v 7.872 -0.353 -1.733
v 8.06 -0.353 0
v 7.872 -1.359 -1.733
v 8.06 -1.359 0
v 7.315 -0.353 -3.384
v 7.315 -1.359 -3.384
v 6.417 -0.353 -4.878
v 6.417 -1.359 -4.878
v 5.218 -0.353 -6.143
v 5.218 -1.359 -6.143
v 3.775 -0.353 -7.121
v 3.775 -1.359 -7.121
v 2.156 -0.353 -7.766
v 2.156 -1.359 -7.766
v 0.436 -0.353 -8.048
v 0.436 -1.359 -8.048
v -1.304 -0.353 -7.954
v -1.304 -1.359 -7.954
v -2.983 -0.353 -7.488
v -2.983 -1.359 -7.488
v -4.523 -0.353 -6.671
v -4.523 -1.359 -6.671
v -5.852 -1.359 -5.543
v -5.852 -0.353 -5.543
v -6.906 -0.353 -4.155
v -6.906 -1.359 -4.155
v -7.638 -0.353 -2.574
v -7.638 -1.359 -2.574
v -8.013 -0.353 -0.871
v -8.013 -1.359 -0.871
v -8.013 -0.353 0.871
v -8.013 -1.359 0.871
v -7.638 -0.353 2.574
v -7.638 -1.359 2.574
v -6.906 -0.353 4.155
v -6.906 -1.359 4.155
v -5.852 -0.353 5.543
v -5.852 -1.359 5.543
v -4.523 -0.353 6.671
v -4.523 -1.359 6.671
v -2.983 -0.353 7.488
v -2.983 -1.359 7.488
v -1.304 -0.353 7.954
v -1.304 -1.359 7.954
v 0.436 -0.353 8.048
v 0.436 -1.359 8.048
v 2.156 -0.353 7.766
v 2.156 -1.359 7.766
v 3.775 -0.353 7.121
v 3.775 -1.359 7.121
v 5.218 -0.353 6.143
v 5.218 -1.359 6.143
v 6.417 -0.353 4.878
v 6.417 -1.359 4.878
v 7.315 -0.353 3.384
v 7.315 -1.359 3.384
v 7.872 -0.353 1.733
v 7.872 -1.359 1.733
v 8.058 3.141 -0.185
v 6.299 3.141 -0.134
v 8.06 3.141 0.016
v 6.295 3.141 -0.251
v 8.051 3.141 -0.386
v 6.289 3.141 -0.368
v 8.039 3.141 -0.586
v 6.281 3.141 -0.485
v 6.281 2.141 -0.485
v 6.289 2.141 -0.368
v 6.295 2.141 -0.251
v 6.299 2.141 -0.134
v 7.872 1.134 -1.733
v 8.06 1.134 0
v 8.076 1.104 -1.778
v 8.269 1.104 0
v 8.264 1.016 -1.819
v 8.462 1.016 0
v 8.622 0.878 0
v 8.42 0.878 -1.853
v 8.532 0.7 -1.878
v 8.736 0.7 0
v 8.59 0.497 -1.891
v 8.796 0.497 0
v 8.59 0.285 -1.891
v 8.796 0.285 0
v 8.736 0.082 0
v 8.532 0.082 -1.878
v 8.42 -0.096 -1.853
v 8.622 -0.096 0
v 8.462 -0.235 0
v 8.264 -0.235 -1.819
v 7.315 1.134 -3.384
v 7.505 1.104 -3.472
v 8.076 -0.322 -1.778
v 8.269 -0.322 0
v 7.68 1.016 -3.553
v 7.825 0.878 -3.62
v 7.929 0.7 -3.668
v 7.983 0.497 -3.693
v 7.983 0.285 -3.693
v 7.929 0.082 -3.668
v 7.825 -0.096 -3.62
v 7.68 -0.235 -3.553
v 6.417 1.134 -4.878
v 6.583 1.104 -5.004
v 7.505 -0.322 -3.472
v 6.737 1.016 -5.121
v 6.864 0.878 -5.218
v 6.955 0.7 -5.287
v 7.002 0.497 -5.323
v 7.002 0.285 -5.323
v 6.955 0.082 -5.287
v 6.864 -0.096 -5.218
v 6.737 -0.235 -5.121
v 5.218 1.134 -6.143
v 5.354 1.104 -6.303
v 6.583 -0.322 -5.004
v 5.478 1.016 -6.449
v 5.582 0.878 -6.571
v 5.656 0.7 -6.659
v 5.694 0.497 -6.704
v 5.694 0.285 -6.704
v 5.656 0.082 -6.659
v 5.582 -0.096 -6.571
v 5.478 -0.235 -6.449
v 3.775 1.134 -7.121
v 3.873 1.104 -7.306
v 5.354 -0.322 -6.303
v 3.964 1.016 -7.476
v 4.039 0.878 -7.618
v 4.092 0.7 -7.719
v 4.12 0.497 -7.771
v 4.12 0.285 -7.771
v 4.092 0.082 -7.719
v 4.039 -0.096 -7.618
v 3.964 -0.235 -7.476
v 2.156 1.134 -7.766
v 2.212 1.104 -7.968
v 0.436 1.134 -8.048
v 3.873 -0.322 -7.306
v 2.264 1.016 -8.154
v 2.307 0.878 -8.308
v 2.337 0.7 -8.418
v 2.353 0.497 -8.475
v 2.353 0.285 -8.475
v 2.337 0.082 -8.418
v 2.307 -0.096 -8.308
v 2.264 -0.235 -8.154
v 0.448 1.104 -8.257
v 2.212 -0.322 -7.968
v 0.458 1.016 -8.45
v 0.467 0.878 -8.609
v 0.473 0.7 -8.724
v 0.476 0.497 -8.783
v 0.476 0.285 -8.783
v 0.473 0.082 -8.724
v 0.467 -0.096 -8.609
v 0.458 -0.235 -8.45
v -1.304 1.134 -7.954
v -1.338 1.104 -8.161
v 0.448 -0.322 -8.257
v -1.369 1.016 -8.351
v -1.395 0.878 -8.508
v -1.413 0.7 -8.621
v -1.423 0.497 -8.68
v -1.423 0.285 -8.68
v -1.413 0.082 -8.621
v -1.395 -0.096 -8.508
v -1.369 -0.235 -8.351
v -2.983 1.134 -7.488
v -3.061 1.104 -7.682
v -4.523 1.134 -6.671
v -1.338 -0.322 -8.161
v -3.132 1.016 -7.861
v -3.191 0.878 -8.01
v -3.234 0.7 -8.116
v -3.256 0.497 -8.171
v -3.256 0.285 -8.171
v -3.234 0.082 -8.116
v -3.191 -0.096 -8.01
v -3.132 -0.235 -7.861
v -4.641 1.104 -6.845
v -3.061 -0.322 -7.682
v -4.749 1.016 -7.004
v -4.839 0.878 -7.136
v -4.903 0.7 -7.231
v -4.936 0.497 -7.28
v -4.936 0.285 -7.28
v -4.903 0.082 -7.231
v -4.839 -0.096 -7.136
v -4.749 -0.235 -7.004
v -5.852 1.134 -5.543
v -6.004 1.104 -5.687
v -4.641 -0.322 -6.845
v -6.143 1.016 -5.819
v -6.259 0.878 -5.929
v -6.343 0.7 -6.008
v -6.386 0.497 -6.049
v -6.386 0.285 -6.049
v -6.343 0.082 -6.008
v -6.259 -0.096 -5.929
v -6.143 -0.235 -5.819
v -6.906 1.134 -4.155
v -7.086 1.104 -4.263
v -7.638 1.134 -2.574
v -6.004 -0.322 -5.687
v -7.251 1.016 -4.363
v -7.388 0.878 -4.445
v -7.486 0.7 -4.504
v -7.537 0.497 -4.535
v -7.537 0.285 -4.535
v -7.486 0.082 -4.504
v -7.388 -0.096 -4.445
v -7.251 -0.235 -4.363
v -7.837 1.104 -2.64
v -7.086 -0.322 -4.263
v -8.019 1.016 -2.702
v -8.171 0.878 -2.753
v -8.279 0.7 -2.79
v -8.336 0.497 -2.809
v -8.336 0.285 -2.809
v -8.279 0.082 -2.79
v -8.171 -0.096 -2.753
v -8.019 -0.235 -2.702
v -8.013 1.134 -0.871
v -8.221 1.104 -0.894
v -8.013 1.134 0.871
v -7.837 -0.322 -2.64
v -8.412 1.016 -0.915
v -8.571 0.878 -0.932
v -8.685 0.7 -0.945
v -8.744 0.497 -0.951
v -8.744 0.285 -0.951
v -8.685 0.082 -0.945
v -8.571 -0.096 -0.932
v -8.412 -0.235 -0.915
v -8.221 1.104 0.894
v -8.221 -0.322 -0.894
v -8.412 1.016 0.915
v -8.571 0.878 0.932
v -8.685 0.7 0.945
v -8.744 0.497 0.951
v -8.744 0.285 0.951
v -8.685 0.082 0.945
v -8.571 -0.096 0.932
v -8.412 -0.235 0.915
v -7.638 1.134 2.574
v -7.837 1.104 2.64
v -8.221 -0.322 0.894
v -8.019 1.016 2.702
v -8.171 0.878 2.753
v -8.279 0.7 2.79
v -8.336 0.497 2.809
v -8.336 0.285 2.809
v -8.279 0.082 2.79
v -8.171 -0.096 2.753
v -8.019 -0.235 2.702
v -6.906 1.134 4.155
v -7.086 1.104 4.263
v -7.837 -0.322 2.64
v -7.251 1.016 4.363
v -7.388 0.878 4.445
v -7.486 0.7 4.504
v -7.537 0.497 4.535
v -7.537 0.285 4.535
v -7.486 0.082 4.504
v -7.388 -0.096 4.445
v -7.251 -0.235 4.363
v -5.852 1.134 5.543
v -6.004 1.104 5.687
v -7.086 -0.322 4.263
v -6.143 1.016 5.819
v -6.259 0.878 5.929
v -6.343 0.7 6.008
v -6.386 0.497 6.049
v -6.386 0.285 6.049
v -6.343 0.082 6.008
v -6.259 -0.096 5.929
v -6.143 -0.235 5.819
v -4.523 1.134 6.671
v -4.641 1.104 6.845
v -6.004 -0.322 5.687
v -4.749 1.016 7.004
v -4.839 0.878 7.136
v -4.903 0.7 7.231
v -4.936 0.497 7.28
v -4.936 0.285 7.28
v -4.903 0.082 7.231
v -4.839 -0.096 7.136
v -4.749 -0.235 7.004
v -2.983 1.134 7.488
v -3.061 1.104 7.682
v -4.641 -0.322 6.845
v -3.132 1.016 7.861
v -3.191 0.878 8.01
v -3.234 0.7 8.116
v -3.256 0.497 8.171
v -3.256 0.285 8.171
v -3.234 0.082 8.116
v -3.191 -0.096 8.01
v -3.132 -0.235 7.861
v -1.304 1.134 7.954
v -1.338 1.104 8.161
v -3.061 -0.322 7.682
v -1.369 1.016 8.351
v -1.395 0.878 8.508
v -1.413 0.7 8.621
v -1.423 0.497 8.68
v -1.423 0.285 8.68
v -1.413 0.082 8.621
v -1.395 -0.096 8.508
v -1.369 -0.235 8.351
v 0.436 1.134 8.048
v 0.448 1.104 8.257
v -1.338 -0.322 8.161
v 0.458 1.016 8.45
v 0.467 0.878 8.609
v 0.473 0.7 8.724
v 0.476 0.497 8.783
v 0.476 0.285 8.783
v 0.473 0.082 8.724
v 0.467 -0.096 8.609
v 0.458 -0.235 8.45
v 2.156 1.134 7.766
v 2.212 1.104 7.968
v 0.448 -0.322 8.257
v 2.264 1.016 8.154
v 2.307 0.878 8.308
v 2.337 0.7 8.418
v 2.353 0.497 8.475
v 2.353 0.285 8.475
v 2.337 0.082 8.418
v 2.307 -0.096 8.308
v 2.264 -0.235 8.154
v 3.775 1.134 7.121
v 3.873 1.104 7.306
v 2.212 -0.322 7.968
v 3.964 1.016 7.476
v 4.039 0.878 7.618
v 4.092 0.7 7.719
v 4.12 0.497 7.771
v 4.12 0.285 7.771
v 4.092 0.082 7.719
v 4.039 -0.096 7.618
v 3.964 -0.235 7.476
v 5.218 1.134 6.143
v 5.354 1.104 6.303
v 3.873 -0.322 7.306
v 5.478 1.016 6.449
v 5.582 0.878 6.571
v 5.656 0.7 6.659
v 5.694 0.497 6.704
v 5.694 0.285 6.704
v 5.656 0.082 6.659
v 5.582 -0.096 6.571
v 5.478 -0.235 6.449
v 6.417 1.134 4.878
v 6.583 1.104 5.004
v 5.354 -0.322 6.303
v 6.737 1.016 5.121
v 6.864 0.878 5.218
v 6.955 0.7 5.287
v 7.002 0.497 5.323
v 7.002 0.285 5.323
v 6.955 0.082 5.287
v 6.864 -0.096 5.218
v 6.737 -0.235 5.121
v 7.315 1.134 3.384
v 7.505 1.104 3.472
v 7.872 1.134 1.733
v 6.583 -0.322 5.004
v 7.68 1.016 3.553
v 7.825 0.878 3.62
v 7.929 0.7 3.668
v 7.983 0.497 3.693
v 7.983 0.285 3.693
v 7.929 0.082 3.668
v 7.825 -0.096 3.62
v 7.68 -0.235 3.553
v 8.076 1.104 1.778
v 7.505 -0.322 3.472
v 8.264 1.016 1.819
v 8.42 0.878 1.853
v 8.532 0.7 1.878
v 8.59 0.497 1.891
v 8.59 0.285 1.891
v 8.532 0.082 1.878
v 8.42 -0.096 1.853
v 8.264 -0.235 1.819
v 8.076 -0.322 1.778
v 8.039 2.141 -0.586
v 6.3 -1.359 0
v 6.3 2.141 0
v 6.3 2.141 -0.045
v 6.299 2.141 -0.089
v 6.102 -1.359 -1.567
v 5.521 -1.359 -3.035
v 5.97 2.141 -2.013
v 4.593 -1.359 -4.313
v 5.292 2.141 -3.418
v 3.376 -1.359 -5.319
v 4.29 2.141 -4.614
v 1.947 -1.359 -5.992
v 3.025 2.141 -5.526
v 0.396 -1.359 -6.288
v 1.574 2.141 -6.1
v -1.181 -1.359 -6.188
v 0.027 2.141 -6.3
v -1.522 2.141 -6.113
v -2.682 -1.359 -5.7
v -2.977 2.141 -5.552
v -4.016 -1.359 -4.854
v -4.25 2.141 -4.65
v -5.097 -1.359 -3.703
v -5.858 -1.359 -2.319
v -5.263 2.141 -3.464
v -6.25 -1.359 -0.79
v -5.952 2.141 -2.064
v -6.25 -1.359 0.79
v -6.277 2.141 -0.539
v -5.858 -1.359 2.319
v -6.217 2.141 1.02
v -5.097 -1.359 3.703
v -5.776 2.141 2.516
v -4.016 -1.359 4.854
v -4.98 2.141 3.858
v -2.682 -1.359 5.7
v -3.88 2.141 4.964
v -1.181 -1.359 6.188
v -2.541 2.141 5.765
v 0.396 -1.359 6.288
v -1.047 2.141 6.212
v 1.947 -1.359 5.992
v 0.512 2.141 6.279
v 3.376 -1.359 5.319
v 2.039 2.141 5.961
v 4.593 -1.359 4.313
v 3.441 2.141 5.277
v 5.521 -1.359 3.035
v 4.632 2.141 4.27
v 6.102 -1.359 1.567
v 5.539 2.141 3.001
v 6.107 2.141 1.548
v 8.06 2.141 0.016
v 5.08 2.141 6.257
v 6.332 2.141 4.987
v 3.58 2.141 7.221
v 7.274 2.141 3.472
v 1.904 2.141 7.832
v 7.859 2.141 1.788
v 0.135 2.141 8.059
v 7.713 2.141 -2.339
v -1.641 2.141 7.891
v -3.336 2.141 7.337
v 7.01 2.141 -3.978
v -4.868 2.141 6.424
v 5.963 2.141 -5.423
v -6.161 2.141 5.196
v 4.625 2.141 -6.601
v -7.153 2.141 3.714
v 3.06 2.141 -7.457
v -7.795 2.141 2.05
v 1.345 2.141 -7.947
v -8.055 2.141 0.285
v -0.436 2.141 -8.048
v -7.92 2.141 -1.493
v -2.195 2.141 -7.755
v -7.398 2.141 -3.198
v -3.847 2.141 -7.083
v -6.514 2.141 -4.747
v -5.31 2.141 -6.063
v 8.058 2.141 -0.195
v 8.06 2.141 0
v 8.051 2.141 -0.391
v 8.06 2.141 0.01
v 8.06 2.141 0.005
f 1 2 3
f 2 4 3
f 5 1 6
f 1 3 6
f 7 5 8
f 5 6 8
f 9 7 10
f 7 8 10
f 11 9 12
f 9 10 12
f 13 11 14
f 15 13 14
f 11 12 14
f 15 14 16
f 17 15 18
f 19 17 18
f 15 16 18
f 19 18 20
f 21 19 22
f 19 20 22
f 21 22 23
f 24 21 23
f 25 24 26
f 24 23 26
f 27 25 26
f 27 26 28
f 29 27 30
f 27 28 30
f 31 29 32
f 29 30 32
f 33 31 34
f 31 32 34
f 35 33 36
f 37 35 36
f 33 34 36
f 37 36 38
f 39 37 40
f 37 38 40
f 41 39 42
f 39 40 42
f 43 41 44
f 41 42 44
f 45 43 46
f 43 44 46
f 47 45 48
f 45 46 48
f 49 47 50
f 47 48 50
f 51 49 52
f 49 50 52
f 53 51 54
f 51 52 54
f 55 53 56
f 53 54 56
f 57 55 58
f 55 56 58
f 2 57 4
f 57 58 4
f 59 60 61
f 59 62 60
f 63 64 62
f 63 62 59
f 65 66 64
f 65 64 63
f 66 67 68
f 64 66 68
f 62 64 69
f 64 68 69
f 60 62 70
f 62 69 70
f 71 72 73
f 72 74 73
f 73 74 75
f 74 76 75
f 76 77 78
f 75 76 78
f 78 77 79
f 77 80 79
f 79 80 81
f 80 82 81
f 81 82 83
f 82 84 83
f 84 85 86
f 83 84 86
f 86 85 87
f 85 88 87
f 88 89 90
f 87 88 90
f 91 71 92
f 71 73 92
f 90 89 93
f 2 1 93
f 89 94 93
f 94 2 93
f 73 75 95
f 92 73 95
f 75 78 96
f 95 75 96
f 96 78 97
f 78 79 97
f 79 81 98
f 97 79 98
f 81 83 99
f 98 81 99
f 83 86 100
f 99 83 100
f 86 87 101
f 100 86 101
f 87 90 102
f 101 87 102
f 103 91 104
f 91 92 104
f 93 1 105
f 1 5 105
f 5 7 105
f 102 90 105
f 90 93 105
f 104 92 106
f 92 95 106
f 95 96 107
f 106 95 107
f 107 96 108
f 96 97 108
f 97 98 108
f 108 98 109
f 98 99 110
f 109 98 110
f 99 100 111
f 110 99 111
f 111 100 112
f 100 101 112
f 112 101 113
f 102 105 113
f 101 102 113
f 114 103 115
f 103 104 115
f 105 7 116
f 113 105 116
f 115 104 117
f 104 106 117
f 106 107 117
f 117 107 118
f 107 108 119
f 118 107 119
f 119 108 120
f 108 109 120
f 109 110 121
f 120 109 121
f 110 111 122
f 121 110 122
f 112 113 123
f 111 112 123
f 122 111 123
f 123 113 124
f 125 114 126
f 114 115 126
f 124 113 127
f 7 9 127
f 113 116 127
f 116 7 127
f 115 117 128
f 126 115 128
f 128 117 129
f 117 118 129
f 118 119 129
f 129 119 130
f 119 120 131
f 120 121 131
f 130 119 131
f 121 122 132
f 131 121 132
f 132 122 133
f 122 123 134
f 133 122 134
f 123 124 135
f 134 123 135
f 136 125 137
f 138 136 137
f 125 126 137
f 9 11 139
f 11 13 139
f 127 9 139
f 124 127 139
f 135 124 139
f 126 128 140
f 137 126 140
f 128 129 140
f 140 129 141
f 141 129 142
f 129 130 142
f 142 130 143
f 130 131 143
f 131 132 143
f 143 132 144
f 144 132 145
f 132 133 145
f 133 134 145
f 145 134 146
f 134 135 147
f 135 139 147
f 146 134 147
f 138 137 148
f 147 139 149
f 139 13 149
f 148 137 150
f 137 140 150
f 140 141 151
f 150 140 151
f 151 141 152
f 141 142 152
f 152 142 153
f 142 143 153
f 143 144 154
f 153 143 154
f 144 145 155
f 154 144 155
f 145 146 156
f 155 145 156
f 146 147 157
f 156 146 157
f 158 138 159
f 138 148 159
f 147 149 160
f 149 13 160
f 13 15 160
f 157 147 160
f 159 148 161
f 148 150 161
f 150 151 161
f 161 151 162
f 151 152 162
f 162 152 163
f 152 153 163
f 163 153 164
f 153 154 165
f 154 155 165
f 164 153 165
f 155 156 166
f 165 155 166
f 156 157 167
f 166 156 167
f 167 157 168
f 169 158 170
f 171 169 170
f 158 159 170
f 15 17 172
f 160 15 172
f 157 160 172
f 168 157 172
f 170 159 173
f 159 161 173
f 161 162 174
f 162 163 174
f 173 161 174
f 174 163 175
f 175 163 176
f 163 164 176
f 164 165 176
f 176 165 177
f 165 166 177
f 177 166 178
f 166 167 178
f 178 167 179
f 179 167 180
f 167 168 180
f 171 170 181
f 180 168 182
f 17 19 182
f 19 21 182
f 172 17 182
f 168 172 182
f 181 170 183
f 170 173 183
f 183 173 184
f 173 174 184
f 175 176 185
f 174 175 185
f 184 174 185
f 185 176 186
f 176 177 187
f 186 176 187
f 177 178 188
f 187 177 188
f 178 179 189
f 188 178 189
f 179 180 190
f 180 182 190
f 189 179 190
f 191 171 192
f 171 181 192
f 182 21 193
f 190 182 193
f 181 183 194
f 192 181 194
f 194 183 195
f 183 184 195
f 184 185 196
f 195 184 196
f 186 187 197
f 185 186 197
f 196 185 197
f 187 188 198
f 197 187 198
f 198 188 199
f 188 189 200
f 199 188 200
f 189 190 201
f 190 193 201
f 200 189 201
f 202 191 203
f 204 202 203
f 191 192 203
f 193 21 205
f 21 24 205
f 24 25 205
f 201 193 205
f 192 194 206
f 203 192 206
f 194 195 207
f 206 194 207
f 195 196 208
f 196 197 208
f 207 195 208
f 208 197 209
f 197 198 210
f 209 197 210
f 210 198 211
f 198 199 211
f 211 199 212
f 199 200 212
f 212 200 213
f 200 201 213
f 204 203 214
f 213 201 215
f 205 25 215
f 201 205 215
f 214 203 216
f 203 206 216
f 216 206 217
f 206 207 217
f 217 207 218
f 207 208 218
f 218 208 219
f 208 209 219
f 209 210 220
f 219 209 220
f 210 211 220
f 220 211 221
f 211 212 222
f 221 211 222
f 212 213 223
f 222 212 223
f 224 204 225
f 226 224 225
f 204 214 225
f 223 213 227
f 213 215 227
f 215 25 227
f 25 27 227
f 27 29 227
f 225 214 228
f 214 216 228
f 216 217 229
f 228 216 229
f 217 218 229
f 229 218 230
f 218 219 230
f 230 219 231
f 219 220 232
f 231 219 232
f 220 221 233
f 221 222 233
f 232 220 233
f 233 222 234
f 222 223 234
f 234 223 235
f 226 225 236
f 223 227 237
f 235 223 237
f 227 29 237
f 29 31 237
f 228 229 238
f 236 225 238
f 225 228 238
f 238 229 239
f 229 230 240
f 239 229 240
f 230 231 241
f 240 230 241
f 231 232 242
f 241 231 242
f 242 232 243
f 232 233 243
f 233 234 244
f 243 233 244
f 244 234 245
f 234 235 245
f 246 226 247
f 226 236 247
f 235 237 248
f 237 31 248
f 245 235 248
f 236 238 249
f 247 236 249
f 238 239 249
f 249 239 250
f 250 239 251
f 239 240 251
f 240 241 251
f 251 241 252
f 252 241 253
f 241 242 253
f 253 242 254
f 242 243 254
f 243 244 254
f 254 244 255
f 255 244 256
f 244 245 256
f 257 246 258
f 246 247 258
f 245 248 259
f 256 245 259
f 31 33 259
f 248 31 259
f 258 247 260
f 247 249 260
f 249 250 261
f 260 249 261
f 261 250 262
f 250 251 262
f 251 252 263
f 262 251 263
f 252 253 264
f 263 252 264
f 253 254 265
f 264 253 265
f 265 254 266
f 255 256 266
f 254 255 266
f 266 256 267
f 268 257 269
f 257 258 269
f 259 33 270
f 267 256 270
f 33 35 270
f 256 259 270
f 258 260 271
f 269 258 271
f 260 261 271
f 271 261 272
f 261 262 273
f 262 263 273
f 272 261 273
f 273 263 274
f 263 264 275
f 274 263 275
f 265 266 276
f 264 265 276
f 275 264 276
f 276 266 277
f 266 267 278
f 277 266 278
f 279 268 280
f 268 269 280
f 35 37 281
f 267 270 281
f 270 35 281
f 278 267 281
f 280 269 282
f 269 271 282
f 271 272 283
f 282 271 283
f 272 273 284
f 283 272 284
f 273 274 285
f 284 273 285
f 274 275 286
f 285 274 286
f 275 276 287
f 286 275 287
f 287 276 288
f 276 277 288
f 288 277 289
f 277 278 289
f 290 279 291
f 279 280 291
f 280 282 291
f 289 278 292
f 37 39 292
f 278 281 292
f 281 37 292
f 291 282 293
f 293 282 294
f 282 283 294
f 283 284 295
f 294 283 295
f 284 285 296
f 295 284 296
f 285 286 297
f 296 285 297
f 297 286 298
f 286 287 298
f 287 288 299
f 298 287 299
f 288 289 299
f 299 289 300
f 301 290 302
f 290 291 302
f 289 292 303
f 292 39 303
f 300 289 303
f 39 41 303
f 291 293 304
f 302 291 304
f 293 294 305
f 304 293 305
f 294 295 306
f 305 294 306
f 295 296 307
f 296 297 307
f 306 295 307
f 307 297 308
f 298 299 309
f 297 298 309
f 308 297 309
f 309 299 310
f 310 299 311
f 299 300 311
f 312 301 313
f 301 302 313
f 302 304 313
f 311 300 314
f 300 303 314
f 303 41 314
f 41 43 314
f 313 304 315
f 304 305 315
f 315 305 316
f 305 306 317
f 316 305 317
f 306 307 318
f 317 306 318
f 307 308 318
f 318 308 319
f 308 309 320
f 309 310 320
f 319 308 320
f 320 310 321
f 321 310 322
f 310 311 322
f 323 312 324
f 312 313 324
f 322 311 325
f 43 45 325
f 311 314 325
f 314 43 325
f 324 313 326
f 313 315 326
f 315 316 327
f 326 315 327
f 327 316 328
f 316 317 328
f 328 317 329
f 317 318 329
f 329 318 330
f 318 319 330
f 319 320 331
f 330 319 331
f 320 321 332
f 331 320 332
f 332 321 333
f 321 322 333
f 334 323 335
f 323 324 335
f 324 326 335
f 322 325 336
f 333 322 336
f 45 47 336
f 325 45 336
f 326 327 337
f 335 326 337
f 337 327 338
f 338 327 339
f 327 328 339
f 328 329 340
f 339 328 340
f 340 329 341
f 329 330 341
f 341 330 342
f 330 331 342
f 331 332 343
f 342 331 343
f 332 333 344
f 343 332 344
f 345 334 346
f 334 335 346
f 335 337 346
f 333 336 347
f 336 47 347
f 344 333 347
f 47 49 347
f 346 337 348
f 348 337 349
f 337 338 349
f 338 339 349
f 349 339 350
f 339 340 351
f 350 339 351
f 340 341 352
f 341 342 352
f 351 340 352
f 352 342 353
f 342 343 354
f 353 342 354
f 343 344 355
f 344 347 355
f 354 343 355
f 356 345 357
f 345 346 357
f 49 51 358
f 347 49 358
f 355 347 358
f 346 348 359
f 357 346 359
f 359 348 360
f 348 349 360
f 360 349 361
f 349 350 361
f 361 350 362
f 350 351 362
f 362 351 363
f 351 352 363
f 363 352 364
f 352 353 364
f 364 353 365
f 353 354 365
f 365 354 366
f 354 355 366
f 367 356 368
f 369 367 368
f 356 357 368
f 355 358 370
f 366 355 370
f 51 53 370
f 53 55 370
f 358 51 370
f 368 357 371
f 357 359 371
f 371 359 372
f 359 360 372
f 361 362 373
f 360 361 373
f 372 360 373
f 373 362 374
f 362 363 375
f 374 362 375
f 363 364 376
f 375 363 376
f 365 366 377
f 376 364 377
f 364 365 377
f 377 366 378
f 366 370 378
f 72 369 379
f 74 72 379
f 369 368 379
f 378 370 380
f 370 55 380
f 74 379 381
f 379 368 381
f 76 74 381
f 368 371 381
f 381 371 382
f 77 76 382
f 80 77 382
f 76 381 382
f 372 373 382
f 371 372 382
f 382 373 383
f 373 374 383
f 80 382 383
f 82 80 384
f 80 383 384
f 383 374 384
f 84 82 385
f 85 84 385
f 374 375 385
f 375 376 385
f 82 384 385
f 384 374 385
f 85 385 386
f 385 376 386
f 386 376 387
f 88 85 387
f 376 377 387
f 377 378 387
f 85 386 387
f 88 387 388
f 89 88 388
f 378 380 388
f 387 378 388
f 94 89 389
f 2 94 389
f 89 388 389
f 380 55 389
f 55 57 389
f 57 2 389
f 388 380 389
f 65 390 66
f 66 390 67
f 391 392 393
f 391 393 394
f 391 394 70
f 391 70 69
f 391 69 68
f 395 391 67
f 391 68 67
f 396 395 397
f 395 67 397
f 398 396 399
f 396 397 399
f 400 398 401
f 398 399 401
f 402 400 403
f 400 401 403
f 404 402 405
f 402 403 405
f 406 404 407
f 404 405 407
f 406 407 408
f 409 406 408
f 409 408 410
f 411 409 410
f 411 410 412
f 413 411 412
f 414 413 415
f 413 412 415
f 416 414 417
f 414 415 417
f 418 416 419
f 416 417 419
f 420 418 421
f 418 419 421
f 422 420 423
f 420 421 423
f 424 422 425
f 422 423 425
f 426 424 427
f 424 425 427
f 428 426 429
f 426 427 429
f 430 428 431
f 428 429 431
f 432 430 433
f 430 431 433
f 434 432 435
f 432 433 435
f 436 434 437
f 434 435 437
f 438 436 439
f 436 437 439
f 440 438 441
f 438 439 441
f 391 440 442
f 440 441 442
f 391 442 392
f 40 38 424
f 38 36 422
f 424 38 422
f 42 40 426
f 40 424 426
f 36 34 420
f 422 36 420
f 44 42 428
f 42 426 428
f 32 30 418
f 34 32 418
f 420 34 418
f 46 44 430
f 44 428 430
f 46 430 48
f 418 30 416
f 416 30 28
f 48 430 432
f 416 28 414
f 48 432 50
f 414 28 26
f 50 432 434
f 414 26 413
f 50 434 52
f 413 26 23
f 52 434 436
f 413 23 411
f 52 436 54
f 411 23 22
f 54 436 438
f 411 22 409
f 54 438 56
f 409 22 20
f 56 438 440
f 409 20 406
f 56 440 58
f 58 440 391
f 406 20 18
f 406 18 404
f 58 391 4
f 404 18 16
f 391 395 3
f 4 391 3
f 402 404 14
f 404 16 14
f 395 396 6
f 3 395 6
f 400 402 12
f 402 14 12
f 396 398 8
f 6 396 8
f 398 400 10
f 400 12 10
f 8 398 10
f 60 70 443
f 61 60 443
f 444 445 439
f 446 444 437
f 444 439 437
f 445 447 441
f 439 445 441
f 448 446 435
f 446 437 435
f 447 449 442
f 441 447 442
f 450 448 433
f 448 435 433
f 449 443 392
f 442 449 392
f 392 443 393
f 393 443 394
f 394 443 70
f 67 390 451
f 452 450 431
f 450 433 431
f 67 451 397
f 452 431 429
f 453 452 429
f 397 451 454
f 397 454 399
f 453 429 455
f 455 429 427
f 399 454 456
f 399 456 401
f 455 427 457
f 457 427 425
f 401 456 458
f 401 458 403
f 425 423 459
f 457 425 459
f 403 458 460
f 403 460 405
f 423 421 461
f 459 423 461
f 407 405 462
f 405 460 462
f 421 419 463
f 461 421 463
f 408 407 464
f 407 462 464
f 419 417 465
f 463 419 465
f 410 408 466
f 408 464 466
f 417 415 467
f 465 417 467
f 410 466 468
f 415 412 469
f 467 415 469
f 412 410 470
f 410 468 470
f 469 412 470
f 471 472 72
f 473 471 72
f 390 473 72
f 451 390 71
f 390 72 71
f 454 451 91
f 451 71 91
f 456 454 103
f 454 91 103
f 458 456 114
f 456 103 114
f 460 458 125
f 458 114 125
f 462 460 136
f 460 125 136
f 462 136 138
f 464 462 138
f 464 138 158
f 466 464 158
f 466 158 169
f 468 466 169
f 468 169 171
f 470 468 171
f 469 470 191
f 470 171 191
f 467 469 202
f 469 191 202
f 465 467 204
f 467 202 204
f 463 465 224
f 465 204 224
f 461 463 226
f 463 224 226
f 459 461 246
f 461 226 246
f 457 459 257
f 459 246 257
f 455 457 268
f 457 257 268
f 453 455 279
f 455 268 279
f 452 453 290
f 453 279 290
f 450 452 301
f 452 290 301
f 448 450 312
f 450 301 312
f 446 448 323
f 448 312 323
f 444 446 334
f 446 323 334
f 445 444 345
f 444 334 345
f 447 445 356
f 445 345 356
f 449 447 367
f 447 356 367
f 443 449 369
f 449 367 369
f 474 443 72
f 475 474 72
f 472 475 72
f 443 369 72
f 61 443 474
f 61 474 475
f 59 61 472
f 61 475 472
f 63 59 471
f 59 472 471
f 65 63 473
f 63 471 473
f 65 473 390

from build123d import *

# Parameters (mm, degrees)
BOSS_EXTRUDE1_DEPTH = 1


with BuildPart() as part:
    # Sketch1 → Revolve1 (revolve)
    with BuildSketch(Plane.XY):
        with BuildLine():
            Line((8.06, -0.352610192), (8.06, -1.359072581))
            Line((8.06, -1.359072581), (6.3, -1.359072581))
            Line((6.3, -1.359072581), (6.3, 2.140927419))
            Line((6.3, 2.140927419), (8.06, 2.140927419))
            Line((8.06, 2.140927419), (8.06, 1.13446503))
            ThreePointArc((8.06, 1.13446503), (8.803537611, 0.390927419), (8.06, -0.352610192))
        make_face()
    revolve(axis=Axis((0, -133.995441592, 0), (0, 1, 0)))

    # Sketch2 → Boss-Extrude1 (add)
    with BuildSketch(Plane(origin=(0, 2.140927419, 0), x_dir=(1, 0, 0), z_dir=(0, 1, 0))):
        with BuildLine():
            Line((6.298583041, 0.133610171), (8.059984934, -0.015584327))
            ThreePointArc((8.059984934, -0.015584327), (8.054947739, 0.285336502), (8.038679535, 0.585859486))
            Line((8.038679535, 0.585859486), (6.281305641, 0.484973654))
            ThreePointArc((6.281305641, 0.484973654), (6.292397308, 0.309412531), (6.298583041, 0.133610171))
        make_face()
    extrude(amount=BOSS_EXTRUDE1_DEPTH)


solid = part.part
